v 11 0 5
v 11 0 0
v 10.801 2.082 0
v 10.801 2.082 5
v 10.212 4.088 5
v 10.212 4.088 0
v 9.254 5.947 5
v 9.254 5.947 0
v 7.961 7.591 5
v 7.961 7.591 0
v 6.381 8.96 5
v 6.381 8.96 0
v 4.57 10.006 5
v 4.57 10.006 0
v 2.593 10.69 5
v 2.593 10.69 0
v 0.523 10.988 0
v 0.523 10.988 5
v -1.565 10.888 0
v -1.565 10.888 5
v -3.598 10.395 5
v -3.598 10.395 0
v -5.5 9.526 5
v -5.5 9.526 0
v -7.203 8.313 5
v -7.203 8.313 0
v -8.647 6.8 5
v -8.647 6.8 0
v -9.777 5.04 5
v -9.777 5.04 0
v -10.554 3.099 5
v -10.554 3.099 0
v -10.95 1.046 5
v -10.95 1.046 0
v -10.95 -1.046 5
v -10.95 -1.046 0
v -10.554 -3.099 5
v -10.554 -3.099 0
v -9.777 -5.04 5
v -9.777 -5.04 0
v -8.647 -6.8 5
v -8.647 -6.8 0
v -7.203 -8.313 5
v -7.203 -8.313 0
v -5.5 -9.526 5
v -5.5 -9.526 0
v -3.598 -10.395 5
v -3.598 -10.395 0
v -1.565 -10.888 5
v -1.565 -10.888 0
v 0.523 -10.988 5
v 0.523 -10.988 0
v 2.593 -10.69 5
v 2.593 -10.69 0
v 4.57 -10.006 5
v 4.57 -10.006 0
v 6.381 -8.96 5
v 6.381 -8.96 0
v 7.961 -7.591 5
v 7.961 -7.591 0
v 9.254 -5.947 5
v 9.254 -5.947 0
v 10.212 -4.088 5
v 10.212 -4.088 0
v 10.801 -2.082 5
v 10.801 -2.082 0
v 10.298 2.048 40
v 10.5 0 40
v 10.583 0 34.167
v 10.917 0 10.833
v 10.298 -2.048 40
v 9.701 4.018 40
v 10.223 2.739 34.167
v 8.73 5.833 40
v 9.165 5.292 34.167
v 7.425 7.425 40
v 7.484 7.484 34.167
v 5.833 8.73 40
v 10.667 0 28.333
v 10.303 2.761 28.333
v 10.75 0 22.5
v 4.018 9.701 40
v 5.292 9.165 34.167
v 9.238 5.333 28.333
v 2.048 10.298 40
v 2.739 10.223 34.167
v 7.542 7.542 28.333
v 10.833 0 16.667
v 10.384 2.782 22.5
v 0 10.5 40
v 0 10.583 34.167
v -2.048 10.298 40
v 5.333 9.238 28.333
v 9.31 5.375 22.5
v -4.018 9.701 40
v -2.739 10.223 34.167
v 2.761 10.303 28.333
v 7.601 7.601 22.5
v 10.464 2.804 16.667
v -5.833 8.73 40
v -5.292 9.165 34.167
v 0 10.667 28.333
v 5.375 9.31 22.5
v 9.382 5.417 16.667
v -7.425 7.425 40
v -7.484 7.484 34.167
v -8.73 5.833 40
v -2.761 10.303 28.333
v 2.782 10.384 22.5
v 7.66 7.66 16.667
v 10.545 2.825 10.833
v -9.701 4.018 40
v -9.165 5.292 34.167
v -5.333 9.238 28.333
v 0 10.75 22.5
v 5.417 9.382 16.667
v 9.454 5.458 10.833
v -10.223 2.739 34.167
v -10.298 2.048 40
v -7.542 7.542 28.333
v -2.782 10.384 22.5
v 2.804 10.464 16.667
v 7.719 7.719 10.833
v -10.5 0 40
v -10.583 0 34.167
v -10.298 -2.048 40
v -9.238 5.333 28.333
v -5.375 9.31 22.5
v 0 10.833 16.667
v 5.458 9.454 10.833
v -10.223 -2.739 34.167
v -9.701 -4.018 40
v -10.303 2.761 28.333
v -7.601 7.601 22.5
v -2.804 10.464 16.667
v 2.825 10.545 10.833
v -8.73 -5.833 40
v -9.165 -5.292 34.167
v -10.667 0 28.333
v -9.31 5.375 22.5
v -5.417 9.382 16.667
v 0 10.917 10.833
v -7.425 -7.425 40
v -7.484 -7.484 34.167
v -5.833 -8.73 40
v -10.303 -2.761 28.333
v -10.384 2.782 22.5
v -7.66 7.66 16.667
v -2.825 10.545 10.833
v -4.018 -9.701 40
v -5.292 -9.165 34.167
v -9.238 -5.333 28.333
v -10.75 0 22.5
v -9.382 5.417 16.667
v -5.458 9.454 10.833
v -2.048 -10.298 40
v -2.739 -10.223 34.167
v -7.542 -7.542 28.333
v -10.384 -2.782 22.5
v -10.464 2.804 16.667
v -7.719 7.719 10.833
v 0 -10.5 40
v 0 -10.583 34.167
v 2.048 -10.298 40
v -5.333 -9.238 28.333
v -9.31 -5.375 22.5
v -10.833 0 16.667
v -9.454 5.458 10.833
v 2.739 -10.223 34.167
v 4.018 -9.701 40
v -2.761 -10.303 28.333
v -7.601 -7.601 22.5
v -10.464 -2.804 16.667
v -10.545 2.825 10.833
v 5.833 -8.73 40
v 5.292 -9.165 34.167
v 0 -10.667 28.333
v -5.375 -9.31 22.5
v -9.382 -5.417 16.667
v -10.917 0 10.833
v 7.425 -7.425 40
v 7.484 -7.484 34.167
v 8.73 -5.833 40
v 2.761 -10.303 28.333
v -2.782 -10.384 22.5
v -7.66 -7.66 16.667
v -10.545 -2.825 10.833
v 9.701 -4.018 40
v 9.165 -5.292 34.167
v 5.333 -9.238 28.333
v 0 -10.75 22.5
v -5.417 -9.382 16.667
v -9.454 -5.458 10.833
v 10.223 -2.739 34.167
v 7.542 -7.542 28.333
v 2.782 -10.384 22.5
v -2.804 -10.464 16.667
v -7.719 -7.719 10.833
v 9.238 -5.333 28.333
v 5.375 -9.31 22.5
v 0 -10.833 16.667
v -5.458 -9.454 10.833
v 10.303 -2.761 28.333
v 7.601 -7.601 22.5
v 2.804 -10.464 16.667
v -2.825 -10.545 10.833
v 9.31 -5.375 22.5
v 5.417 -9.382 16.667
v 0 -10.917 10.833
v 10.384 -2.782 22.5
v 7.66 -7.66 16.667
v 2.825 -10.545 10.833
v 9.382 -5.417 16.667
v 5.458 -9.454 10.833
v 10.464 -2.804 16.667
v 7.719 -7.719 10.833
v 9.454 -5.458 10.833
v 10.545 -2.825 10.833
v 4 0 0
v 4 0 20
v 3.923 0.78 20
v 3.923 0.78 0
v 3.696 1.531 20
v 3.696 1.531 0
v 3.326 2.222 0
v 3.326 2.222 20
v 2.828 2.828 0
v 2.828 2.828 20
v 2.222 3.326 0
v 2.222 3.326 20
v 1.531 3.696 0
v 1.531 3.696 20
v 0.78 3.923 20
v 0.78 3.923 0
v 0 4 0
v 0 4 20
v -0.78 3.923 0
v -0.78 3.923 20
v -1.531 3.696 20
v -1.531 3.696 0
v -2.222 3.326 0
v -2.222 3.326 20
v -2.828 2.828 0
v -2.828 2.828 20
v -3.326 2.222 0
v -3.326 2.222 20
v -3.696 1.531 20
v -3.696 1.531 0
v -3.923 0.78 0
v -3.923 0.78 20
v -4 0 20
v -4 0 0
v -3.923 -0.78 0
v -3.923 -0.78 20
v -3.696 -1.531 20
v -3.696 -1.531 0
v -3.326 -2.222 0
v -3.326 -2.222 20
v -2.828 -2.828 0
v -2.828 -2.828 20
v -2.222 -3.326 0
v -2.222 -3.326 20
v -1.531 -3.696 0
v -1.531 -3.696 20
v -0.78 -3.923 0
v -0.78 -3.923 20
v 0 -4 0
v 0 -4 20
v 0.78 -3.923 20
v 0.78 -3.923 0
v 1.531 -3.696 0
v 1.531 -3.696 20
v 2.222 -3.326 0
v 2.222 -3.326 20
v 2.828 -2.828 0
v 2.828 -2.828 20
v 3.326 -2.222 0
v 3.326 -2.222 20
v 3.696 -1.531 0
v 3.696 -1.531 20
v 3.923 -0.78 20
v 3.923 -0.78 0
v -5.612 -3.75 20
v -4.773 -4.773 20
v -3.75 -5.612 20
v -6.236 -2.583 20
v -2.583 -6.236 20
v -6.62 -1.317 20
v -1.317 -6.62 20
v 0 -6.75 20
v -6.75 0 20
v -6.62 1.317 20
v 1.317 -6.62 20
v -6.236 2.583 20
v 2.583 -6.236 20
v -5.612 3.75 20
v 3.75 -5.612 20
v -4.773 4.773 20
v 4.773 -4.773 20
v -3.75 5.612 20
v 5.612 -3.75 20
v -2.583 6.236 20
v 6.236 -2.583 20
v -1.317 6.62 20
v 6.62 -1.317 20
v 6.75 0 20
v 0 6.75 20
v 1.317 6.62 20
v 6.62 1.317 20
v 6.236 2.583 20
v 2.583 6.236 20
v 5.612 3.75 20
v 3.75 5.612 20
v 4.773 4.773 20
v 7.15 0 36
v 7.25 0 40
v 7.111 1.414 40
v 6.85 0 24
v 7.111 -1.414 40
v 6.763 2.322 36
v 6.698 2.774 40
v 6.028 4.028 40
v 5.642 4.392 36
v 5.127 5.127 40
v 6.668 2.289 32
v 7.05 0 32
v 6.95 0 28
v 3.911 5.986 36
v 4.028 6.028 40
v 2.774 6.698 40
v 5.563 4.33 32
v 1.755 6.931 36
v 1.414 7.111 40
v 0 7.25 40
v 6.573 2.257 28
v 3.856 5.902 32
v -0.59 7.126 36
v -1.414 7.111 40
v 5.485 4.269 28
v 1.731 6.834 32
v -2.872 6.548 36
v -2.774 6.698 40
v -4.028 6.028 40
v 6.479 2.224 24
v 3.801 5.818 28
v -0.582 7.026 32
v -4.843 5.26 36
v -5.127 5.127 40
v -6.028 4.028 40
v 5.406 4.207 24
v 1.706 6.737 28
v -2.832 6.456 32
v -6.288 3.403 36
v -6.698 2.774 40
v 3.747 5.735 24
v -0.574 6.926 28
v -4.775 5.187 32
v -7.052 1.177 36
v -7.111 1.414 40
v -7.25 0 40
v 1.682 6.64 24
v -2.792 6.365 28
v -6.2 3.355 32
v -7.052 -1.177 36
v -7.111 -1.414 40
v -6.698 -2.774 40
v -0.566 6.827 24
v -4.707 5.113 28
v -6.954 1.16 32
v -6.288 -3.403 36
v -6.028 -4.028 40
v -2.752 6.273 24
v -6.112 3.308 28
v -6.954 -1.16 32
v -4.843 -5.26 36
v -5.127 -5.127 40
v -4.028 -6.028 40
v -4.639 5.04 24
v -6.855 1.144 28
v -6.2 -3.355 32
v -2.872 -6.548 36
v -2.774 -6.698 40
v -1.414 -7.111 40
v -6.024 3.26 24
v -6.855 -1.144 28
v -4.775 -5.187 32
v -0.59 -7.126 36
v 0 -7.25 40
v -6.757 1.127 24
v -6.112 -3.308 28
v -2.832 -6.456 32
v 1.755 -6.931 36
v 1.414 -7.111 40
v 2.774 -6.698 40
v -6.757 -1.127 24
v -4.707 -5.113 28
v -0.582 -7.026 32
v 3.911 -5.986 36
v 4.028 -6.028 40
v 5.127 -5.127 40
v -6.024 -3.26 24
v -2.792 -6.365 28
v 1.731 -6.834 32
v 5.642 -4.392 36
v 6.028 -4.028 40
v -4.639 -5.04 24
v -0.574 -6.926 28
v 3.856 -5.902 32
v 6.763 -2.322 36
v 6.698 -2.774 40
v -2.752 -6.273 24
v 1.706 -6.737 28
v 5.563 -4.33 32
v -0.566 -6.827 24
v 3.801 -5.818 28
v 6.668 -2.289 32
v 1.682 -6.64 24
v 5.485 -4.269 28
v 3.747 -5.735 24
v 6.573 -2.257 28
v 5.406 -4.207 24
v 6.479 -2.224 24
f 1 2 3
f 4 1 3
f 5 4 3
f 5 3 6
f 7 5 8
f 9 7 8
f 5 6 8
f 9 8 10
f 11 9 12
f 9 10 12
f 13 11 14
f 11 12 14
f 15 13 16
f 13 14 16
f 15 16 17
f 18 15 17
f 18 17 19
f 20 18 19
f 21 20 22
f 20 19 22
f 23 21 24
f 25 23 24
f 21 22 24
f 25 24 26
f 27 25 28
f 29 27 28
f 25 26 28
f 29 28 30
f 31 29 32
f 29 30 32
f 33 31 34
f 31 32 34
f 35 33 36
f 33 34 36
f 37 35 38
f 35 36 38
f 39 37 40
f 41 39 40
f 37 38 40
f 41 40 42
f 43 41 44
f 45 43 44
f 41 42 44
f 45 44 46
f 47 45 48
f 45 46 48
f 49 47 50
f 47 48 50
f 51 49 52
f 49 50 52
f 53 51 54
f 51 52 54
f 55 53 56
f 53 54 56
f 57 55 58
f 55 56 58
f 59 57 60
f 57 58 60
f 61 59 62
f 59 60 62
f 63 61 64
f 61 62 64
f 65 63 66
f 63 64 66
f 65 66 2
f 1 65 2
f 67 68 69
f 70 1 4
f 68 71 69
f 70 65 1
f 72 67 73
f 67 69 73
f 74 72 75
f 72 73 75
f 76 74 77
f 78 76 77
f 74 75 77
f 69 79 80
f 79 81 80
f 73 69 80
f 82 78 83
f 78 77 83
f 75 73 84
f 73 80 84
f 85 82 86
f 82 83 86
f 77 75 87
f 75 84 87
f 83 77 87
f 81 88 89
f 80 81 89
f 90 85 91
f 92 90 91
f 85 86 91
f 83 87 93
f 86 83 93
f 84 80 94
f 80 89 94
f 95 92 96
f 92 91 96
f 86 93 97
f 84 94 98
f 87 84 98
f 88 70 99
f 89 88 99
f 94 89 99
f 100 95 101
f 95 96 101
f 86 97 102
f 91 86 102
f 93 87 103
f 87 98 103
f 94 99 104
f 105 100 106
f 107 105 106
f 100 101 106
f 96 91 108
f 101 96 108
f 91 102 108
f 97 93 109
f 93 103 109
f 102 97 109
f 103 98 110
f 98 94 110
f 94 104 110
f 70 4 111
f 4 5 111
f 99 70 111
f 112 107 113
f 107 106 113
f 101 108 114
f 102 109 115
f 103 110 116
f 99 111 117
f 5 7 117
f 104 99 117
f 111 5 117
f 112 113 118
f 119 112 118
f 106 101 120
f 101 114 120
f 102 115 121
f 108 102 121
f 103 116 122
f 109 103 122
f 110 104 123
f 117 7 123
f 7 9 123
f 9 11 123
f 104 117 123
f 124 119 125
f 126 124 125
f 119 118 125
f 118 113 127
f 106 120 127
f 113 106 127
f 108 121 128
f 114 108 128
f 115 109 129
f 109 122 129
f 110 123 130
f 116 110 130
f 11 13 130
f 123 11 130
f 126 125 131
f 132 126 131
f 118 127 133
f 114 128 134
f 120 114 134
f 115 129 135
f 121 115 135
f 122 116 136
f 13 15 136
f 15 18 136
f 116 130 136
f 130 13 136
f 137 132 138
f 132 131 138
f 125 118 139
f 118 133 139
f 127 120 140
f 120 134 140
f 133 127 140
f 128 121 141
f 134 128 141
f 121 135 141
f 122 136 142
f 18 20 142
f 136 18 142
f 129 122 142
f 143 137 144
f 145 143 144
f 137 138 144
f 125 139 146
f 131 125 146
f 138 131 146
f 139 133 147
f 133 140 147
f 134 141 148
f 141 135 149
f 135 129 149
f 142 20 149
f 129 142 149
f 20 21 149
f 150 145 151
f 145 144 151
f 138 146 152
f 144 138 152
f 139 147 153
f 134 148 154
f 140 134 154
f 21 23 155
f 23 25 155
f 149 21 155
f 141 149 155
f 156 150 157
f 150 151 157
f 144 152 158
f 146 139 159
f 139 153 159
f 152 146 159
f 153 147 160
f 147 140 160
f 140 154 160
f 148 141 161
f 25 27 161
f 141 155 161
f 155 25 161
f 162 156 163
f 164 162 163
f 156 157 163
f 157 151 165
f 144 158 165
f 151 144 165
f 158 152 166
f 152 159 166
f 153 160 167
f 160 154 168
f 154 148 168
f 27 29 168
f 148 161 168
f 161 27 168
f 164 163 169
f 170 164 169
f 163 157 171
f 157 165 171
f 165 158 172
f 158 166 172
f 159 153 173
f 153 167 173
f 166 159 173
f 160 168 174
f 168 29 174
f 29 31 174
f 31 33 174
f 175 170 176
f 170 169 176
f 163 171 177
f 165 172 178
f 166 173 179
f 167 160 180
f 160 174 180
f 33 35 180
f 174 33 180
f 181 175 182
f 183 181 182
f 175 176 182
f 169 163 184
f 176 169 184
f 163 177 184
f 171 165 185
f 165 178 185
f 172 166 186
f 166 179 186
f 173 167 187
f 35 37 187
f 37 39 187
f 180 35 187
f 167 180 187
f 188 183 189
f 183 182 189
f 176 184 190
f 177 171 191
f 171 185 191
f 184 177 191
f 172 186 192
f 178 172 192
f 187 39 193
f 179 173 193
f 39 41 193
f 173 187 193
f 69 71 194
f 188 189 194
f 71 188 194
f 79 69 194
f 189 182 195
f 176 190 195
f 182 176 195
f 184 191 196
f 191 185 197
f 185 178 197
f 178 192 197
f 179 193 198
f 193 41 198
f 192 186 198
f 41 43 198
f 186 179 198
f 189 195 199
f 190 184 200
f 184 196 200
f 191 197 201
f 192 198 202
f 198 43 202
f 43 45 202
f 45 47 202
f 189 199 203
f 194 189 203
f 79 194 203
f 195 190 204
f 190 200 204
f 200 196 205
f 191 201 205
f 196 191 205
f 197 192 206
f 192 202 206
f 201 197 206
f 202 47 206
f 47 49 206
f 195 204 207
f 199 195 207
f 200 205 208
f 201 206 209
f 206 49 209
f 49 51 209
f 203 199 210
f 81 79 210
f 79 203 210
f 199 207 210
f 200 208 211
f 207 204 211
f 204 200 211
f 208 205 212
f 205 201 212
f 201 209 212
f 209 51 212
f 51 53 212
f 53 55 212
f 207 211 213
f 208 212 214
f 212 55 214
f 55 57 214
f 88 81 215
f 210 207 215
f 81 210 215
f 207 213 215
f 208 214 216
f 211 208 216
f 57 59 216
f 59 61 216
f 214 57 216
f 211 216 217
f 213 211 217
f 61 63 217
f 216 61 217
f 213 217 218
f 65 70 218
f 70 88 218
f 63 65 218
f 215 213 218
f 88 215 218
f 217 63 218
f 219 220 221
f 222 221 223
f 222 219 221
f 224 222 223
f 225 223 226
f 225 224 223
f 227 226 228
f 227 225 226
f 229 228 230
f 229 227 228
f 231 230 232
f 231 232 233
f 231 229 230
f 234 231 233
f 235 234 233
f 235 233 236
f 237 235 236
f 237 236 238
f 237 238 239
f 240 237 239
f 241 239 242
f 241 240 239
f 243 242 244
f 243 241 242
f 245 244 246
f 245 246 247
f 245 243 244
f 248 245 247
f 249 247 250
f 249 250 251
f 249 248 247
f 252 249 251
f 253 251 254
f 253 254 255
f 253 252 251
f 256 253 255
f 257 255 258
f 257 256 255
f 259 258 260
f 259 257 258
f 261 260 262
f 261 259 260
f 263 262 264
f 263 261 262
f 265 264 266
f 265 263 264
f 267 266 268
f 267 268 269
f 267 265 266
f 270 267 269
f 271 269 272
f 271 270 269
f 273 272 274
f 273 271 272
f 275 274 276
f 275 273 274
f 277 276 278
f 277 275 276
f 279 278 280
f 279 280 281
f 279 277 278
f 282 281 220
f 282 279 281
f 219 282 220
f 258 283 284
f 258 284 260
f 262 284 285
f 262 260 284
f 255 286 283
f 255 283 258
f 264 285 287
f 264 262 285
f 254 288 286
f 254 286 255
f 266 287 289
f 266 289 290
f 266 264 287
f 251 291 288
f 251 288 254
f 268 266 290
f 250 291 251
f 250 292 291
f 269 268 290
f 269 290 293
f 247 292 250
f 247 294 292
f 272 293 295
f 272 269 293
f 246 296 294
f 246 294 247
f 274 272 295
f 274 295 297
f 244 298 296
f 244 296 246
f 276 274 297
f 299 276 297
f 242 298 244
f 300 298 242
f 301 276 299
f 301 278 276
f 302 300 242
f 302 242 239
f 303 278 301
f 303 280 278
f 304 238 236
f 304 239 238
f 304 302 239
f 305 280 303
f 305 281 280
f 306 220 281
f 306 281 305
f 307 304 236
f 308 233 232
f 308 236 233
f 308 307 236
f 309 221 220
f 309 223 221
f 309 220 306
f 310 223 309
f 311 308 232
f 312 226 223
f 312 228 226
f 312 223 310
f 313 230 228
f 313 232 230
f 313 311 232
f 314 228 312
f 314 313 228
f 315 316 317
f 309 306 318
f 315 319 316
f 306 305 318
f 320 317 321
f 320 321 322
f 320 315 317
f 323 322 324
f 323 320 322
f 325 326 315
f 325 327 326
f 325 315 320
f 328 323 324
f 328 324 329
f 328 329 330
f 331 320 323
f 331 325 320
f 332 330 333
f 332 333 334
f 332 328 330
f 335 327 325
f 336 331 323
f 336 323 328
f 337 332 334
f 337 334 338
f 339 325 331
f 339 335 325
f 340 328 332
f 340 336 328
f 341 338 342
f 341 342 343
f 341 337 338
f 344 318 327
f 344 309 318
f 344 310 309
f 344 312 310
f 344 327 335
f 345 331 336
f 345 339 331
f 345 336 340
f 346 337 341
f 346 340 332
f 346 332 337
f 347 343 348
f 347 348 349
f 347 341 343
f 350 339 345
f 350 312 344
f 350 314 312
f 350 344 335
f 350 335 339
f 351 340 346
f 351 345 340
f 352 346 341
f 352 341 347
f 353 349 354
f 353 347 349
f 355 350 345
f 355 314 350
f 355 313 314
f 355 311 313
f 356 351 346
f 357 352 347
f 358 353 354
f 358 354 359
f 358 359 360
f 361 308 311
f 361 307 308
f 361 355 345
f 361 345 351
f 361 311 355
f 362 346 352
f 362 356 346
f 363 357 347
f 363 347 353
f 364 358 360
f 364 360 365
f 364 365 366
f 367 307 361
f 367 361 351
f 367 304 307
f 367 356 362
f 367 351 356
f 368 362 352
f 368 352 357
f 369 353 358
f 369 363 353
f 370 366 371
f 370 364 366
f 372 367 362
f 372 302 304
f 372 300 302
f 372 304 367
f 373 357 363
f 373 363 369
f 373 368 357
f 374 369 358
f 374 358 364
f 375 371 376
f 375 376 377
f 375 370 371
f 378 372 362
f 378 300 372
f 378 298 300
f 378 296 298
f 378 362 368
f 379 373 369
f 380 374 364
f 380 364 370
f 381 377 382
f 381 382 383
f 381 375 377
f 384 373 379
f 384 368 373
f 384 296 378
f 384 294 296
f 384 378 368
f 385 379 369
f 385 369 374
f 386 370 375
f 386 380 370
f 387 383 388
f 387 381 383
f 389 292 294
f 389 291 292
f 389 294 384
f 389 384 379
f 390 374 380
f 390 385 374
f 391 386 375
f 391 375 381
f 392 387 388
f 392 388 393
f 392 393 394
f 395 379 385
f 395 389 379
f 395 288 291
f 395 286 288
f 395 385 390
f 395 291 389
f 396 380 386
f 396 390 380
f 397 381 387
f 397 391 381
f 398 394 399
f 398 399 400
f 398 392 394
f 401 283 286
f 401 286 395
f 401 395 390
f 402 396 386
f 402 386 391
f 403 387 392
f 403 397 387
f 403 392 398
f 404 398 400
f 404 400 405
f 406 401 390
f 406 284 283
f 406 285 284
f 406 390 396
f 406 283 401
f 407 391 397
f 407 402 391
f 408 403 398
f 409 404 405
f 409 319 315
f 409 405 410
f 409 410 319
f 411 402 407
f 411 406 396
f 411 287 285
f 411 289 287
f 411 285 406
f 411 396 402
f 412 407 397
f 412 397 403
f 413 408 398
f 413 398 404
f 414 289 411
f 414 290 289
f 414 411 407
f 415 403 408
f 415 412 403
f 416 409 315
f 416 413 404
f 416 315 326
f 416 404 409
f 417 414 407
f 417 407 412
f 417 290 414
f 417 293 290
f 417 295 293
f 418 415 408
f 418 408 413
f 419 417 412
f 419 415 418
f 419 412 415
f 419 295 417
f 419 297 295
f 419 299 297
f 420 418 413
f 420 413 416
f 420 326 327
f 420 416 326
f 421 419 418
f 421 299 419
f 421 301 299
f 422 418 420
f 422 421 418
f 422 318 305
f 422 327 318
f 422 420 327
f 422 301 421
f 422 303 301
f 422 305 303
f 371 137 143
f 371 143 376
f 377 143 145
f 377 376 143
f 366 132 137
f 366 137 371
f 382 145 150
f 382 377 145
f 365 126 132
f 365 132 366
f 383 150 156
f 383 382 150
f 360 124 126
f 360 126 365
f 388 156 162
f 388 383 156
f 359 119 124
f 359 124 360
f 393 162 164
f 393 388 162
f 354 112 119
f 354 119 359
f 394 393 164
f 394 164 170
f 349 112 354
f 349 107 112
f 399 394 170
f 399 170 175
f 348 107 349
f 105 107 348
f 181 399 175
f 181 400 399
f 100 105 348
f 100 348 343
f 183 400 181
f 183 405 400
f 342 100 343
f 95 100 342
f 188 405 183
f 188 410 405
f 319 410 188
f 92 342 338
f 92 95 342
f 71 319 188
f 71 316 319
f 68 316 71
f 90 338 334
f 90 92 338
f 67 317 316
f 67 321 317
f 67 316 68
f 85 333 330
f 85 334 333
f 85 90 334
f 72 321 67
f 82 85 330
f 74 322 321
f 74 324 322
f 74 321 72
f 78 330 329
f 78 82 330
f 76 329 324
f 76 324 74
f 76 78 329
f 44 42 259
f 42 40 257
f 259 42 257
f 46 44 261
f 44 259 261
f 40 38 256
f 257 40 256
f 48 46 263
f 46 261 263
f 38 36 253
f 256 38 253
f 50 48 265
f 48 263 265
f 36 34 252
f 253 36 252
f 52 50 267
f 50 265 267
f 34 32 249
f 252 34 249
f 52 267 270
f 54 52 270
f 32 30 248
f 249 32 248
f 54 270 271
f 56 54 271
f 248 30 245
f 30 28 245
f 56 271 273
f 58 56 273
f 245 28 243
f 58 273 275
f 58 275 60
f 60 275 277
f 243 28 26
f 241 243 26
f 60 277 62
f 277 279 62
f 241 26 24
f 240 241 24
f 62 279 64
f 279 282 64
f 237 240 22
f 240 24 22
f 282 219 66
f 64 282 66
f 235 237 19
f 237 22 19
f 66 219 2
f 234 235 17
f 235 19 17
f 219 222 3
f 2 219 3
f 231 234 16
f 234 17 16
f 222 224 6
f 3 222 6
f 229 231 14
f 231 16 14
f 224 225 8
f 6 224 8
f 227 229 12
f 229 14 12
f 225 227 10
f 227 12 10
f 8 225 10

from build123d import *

# Parameters (mm, degrees)
F0_R     = 11
F0_R_2   = 6.75
F1_DEPTH = 40
F0_R_3   = 4
F2_DEPTH = 20
F3_SIZE2 = 19.99999
F3_SIZE  = 0.49999
F4_SIZE2 = 35
F4_SIZE  = 0.5


# Not quite as in the source:
# - a fillet or chamfer is up to 0.001 mm smaller than in the source, because OpenCascade refuses the exact size


with BuildPart() as f1:
    # F0 (on Top) → F1 (new body)
    with BuildSketch(Plane.XY):
        Circle(F0_R)
        Circle(F0_R_2, mode=Mode.SUBTRACT)
    extrude(amount=F1_DEPTH)

    # F0 (on Top) → F2 (join)
    with BuildSketch(Plane.XY):
        Circle(F0_R_2)
        Circle(F0_R_3, mode=Mode.SUBTRACT)
    extrude(amount=F2_DEPTH)

    # F3 (size 0.5 and 20 in the source; OpenCascade refuses exactly that, so slightly less here)
    f3_edges = [f1.edges().sort_by_distance(p)[0] for p in [
        (-6.75, 0, 40),
    ]]
    f3_side = f1.faces().sort_by_distance((-10.688873, 0, 40))[0]
    chamfer(f3_edges, length=F3_SIZE, length2=F3_SIZE2, reference=f3_side)

    # F4
    f4_edges = [f1.edges().sort_by_distance(p)[0] for p in [
        (-11, 0, 40),
    ]]
    f4_side = f1.faces().sort_by_distance((-7.561117, 0, 40))[0]
    chamfer(f4_edges, length=F4_SIZE, length2=F4_SIZE2, reference=f4_side)


solid = f1.part
